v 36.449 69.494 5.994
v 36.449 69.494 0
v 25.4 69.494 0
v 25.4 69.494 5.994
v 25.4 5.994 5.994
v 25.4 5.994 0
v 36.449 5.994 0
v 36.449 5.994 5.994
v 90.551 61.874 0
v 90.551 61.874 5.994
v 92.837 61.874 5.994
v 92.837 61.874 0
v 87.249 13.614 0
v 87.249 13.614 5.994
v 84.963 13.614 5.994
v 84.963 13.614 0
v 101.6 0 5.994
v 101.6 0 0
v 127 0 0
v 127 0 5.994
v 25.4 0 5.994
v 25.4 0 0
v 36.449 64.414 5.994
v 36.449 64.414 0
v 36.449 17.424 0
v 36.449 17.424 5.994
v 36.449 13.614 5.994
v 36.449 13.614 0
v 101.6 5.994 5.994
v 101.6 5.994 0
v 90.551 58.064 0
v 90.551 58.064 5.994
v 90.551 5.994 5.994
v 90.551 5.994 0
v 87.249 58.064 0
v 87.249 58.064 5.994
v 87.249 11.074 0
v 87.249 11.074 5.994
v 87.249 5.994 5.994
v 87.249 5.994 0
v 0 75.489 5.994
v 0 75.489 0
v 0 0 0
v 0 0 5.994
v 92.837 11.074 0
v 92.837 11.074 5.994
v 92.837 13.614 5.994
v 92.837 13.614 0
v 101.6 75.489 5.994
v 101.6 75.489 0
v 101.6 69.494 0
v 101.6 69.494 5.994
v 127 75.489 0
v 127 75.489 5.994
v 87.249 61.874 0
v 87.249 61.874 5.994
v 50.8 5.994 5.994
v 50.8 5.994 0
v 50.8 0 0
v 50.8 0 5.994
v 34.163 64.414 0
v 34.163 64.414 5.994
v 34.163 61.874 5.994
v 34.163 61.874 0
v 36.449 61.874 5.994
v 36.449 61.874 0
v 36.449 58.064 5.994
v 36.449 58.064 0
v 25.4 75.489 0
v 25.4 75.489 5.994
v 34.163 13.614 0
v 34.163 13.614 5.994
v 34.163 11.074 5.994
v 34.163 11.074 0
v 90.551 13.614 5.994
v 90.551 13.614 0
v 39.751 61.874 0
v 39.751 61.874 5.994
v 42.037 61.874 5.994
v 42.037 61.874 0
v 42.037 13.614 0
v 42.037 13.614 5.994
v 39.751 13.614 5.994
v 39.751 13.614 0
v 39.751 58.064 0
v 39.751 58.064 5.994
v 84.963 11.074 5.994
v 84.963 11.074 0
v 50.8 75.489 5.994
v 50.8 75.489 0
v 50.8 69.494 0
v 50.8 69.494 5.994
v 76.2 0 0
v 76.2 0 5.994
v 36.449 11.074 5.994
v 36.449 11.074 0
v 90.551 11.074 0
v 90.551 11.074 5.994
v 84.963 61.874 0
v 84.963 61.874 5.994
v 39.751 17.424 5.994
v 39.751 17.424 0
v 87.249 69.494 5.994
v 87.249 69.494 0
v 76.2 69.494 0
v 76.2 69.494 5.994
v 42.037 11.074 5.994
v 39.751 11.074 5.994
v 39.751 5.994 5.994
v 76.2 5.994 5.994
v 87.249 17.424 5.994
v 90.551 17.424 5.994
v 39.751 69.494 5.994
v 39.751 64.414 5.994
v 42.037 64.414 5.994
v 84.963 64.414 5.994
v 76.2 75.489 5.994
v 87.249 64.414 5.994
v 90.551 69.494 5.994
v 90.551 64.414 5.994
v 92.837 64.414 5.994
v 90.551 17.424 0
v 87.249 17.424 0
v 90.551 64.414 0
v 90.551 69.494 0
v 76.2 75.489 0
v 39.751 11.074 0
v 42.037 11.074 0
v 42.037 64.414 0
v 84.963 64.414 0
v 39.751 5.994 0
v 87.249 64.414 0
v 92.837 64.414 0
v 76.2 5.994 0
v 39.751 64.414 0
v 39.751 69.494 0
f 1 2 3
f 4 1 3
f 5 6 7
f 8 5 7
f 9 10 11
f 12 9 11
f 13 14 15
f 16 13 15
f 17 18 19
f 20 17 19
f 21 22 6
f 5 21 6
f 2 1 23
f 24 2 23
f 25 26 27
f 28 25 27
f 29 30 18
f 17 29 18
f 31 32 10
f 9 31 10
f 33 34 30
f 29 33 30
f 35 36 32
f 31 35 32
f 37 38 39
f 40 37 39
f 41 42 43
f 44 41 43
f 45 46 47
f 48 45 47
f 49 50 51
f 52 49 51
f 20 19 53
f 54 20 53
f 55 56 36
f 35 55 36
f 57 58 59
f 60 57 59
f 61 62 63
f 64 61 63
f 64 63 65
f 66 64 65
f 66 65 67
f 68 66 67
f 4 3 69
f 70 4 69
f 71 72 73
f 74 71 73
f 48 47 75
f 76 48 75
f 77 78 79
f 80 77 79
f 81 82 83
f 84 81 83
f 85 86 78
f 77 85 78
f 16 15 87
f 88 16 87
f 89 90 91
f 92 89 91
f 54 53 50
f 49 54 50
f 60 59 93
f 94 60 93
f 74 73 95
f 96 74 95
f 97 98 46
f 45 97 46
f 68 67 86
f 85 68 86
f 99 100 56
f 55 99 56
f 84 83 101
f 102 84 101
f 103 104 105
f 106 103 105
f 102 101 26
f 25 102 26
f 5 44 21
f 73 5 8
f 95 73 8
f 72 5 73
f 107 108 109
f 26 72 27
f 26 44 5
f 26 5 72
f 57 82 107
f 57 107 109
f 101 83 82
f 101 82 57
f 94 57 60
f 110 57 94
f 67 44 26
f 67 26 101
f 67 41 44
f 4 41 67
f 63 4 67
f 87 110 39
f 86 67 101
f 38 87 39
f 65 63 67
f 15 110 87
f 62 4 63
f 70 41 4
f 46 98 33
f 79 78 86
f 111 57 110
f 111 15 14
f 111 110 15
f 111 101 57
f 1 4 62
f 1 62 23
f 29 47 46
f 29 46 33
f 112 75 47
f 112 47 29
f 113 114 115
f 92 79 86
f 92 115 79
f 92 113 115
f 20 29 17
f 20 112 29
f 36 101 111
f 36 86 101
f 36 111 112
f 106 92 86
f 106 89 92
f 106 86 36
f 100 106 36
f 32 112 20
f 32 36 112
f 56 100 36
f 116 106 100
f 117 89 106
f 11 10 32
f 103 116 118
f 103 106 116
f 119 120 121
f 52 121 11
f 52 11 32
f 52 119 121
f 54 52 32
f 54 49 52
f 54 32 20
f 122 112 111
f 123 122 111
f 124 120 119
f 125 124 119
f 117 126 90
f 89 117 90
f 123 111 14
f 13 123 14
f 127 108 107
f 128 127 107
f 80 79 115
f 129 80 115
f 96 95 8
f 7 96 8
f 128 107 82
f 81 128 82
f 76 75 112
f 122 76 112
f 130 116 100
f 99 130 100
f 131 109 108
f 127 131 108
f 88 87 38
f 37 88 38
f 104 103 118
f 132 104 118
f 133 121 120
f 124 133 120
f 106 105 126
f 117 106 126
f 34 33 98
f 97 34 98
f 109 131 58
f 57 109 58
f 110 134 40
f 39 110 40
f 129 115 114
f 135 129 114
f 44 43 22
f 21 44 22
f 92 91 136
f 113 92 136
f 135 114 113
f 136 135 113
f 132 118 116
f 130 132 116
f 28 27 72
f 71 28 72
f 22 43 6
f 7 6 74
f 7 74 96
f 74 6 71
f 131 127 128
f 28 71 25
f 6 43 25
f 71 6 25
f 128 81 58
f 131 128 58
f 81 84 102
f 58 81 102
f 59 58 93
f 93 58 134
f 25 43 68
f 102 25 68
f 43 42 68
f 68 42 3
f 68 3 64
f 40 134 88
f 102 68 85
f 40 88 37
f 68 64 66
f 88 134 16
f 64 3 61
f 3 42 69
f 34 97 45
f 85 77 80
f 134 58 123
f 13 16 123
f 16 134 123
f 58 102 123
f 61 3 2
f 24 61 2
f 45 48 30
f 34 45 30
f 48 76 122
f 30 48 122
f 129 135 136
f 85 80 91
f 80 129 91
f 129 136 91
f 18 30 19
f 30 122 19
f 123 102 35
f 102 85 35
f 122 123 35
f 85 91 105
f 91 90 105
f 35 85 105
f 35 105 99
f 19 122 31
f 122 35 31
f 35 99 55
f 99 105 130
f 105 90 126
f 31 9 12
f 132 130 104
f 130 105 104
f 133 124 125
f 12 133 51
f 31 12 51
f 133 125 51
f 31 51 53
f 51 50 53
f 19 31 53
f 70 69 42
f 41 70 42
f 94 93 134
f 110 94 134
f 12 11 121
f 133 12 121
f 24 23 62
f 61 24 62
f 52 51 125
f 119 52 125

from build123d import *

# Parameters (mm, degrees)
BOSS_EXTRUDE1_DEPTH = 5.9944
CUT_EXTRUDE2_DEPTH  = 5.9944


with BuildPart() as part:
    # Sketch1 → Boss-Extrude1 (new body)
    with BuildSketch(Plane.XY):
        Polygon((25.4, 5.9944), (50.8, 5.9944), (50.8, 0), (76.2, 0), (76.2, 5.9944), (101.6, 5.9944), (101.6, 0), (127, 0), (127, 75.4888), (101.6, 75.4888), (101.6, 69.4944), (76.2, 69.4944), (76.2, 75.4888), (50.8, 75.4888), (50.8, 69.4944), (25.4, 69.4944), (25.4, 75.4888), (0, 75.4888), (0, 0), (25.4, 0), align=None)
    extrude(amount=BOSS_EXTRUDE1_DEPTH)

    # Sketch2 → Cut-Extrude2 (cut)
    with BuildSketch(Plane.XY.offset(5.9944)):
        Polygon((36.449, 69.4944), (36.449, 64.4144), (34.163, 64.4144), (34.163, 61.8744), (36.449, 61.8744), (36.449, 58.0644), (39.751, 58.0644), (39.751, 61.8744), (42.037, 61.8744), (42.037, 64.4144), (39.751, 64.4144), (39.751, 69.4944), align=None)
        Polygon((36.449, 5.9944), (39.751, 5.9944), (39.751, 11.0744), (42.037, 11.0744), (42.037, 13.6144), (39.751, 13.6144), (39.751, 17.4244), (36.449, 17.4244), (36.449, 13.6144), (34.163, 13.6144), (34.163, 11.0744), (36.449, 11.0744), align=None)
        Polygon((90.551, 5.9944), (90.551, 11.0744), (92.837, 11.0744), (92.837, 13.6144), (90.551, 13.6144), (90.551, 17.4244), (87.249, 17.4244), (87.249, 13.6144), (84.963, 13.6144), (84.963, 11.0744), (87.249, 11.0744), (87.249, 5.9944), align=None)
        Polygon((90.551, 69.4944), (87.249, 69.4944), (87.249, 64.4144), (84.963, 64.4144), (84.963, 61.8744), (87.249, 61.8744), (87.249, 58.0644), (90.551, 58.0644), (90.551, 61.8744), (92.837, 61.8744), (92.837, 64.4144), (90.551, 64.4144), align=None)
    extrude(amount=-CUT_EXTRUDE2_DEPTH, mode=Mode.SUBTRACT)


solid = part.part
